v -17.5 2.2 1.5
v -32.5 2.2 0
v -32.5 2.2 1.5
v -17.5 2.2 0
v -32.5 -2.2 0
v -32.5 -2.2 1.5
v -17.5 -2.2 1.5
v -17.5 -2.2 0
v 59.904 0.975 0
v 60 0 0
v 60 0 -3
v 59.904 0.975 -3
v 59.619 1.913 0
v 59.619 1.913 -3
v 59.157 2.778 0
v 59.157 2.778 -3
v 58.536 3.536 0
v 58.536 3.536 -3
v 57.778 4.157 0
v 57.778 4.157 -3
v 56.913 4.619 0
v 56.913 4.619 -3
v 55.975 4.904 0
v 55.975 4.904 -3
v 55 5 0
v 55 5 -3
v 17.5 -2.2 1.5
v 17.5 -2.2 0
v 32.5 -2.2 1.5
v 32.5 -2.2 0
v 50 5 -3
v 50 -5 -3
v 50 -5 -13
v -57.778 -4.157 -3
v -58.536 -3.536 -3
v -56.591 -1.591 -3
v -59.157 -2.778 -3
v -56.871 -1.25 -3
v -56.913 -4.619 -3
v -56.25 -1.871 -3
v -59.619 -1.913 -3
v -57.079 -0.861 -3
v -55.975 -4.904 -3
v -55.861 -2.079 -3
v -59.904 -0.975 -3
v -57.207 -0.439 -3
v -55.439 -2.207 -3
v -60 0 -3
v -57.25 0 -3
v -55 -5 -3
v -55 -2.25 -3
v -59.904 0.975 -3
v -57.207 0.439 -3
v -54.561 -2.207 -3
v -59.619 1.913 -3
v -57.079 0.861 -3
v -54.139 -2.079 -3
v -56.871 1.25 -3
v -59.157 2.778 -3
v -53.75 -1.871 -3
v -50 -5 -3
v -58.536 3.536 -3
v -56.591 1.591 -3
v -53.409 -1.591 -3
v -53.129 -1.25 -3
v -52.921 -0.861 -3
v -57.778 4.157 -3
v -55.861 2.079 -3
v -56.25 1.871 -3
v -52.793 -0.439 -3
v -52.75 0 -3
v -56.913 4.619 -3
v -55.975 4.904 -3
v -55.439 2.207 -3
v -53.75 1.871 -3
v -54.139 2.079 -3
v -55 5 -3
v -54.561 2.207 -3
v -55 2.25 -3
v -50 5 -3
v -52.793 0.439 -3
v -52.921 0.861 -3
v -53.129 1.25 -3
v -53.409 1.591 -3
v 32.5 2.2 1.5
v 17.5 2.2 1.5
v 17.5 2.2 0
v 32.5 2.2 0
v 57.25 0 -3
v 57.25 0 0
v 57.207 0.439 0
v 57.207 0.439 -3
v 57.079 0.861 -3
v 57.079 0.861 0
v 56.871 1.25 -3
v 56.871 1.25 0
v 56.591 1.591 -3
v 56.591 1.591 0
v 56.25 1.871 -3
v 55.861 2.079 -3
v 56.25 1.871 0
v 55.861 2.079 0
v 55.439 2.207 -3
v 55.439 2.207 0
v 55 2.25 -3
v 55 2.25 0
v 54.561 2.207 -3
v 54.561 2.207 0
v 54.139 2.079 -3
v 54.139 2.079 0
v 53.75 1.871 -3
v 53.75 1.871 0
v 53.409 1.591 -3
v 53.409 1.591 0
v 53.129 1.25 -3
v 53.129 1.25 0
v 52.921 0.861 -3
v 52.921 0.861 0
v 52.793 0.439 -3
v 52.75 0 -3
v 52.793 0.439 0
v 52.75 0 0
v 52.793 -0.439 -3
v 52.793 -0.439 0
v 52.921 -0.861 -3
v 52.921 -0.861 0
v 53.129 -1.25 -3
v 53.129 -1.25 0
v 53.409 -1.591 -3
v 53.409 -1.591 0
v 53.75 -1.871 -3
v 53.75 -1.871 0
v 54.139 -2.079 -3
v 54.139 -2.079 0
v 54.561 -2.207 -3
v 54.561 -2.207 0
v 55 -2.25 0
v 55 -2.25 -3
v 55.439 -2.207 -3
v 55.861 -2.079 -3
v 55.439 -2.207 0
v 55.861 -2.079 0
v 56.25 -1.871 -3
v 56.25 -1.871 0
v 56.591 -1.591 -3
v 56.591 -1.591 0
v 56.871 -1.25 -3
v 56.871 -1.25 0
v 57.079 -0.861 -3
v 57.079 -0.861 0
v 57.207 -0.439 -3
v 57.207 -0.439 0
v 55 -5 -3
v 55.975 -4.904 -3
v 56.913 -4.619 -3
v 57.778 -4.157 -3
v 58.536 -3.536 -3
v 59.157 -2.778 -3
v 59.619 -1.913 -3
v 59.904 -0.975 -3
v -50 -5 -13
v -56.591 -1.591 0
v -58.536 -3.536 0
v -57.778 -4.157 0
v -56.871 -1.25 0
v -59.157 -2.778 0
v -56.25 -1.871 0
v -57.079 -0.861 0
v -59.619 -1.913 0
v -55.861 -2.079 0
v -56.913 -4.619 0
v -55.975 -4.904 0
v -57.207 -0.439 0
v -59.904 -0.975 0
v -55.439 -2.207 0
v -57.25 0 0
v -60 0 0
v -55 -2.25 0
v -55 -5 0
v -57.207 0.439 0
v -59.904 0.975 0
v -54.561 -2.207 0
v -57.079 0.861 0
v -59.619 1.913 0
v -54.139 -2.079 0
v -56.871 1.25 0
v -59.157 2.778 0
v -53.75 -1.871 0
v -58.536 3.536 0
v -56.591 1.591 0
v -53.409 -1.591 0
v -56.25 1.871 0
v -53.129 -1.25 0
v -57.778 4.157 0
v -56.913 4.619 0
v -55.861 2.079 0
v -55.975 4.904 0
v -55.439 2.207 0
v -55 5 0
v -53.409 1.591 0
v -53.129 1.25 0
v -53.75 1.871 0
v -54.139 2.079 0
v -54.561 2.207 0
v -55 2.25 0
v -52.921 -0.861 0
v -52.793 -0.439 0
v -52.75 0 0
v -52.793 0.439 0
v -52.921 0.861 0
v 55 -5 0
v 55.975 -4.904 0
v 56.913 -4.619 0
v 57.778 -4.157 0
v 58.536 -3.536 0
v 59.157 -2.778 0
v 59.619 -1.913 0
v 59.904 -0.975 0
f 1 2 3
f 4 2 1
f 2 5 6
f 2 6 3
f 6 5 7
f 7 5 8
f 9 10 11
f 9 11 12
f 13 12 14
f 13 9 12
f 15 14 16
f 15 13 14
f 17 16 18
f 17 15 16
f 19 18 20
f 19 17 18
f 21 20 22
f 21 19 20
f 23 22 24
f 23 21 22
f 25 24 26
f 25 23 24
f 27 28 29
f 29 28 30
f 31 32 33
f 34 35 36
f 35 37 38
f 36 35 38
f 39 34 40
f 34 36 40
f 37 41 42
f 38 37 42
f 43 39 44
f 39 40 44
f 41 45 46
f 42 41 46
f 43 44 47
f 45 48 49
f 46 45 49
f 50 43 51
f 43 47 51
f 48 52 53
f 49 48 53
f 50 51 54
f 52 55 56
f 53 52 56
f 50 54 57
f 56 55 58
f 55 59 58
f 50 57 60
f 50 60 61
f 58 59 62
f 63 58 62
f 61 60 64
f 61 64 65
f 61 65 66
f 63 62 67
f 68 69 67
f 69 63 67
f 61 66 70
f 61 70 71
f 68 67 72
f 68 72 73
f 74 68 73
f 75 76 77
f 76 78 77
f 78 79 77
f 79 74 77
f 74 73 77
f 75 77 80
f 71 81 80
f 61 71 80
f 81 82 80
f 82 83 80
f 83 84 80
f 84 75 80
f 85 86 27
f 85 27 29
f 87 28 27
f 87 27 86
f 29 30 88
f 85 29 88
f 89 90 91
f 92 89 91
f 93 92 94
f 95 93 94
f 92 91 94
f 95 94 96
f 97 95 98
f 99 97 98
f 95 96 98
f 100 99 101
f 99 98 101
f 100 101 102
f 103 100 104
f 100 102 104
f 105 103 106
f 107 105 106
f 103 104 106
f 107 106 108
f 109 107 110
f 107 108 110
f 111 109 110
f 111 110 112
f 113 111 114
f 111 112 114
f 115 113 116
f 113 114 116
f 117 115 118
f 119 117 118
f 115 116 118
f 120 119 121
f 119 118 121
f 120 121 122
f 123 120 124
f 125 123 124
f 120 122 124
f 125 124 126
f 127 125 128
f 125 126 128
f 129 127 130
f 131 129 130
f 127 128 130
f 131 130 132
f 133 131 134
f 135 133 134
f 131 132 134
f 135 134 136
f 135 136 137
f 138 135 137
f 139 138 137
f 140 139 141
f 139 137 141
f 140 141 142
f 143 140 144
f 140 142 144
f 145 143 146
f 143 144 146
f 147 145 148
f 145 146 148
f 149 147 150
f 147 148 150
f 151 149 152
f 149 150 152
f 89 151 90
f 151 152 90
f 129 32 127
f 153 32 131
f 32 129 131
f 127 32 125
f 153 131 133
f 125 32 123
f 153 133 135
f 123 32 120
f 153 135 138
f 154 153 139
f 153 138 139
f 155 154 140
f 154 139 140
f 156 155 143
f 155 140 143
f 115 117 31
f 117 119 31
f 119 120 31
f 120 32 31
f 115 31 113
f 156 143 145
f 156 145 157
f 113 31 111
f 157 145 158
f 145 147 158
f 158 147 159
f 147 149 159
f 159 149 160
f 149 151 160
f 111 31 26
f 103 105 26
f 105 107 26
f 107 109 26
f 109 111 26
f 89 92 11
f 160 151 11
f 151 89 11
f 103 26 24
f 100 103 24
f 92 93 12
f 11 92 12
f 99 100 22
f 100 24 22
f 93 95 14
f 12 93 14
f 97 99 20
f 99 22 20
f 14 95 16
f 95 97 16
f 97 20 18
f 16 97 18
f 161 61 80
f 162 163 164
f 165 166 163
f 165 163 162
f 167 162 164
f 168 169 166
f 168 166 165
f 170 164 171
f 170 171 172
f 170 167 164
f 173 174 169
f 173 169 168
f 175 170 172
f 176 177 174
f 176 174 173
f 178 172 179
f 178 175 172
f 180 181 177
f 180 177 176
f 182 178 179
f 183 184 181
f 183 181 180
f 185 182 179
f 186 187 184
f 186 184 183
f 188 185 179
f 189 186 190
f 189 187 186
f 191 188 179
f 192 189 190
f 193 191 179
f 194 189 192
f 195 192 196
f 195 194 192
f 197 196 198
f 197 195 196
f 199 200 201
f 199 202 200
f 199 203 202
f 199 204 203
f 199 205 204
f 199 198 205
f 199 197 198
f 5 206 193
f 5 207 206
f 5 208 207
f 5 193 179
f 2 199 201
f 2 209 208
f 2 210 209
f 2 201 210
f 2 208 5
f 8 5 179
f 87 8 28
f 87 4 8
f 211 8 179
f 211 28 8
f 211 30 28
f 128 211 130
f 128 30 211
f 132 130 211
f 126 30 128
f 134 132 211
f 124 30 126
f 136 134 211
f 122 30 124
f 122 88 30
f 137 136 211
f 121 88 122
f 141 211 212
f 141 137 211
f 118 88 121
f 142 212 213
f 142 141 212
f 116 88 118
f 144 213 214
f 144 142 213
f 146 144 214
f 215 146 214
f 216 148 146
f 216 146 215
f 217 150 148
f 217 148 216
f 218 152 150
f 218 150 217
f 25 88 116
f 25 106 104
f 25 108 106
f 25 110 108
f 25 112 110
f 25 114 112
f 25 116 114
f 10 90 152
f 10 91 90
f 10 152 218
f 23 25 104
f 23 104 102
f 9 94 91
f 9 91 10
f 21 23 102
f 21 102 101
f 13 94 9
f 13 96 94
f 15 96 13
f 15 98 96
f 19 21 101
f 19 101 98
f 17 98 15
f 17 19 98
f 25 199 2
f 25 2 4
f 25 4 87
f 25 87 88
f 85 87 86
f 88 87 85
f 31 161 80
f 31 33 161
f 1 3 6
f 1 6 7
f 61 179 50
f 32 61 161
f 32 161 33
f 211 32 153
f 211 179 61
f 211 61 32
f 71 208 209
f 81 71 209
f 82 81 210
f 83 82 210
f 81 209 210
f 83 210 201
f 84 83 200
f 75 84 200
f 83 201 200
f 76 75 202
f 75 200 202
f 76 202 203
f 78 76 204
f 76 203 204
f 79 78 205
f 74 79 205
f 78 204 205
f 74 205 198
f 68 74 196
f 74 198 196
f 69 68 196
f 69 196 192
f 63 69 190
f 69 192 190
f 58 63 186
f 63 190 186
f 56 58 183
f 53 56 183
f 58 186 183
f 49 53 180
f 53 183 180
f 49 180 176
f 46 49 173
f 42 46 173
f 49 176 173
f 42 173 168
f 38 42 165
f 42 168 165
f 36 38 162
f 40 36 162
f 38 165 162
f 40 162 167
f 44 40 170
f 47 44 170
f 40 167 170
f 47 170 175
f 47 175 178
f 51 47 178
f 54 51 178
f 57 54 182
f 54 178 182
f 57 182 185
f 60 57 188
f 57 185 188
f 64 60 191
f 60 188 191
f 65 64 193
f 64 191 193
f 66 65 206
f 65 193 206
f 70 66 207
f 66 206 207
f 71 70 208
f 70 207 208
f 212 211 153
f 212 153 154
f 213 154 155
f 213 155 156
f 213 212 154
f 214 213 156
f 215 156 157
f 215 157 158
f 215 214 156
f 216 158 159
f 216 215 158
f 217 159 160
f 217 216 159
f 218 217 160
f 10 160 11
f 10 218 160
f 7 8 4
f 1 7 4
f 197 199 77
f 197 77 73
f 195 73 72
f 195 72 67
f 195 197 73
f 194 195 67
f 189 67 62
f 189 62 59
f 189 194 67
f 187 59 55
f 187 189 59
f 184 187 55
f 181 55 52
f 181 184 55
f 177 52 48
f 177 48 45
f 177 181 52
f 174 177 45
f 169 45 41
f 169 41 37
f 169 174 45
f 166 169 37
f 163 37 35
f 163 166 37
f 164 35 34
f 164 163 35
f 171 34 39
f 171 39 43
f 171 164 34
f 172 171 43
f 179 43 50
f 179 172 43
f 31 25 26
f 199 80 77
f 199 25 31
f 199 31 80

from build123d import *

# Parameters (mm, degrees)
F0_R     = 2.25
F0_W     = 15
F0_H     = 4.4
F1_DEPTH = 3
F2_DEPTH = 1.5
F4_DEPTH = 50


with BuildPart() as f1:
    # F0 (on Top) → F1 (new body)
    with BuildSketch(Plane.XY):
        with BuildLine():
            ThreePointArc((-50, 0), (-51.464466, 3.535534), (-55, 5))
            ThreePointArc((-55, 5), (-60, 0), (-55, -5))
            ThreePointArc((-55, -5), (-51.464466, -3.535534), (-50, 0))
        make_face()
        with Locations((-55, 0)):
            Circle(F0_R, mode=Mode.SUBTRACT)
        with BuildLine():
            ThreePointArc((55, -5), (50, 0), (55, 5))
            Line((55, 5), (-55, 5))
            ThreePointArc((-55, 5), (-51.464466, 3.535534), (-50, 0))
            ThreePointArc((-50, 0), (-51.464466, -3.535534), (-55, -5))
            Line((-55, -5), (55, -5))
        make_face()
        with Locations((-25, 0)):
            Rectangle(F0_W, F0_H, mode=Mode.SUBTRACT)
        with Locations((25, 0)):
            Rectangle(F0_W, F0_H, mode=Mode.SUBTRACT)
        with Locations((-25, 0)):
            Rectangle(F0_W, F0_H)
        with Locations((25, 0)):
            Rectangle(F0_W, F0_H)
        with BuildLine():
            ThreePointArc((55, -5), (58.535534, -3.535534), (60, 0))
            ThreePointArc((60, 0), (58.535534, 3.535534), (55, 5))
            ThreePointArc((55, 5), (50, 0), (55, -5))
        make_face()
        with Locations((55, 0)):
            Circle(F0_R, mode=Mode.SUBTRACT)
    extrude(amount=-F1_DEPTH)

    # F0 (on Top) → F2 (join)
    with BuildSketch(Plane.XY):
        with Locations((-25, 0)):
            Rectangle(F0_W, F0_H)
        with Locations((25, 0)):
            Rectangle(F0_W, F0_H)
    extrude(amount=F2_DEPTH)

    # F3 (on Right) → F4 (join, symmetric)
    with BuildSketch(Plane.YZ):
        Polygon((5, -3), (-5, -3), (-5, -13), align=None)
    extrude(amount=F4_DEPTH, both=True)


solid = f1.part
